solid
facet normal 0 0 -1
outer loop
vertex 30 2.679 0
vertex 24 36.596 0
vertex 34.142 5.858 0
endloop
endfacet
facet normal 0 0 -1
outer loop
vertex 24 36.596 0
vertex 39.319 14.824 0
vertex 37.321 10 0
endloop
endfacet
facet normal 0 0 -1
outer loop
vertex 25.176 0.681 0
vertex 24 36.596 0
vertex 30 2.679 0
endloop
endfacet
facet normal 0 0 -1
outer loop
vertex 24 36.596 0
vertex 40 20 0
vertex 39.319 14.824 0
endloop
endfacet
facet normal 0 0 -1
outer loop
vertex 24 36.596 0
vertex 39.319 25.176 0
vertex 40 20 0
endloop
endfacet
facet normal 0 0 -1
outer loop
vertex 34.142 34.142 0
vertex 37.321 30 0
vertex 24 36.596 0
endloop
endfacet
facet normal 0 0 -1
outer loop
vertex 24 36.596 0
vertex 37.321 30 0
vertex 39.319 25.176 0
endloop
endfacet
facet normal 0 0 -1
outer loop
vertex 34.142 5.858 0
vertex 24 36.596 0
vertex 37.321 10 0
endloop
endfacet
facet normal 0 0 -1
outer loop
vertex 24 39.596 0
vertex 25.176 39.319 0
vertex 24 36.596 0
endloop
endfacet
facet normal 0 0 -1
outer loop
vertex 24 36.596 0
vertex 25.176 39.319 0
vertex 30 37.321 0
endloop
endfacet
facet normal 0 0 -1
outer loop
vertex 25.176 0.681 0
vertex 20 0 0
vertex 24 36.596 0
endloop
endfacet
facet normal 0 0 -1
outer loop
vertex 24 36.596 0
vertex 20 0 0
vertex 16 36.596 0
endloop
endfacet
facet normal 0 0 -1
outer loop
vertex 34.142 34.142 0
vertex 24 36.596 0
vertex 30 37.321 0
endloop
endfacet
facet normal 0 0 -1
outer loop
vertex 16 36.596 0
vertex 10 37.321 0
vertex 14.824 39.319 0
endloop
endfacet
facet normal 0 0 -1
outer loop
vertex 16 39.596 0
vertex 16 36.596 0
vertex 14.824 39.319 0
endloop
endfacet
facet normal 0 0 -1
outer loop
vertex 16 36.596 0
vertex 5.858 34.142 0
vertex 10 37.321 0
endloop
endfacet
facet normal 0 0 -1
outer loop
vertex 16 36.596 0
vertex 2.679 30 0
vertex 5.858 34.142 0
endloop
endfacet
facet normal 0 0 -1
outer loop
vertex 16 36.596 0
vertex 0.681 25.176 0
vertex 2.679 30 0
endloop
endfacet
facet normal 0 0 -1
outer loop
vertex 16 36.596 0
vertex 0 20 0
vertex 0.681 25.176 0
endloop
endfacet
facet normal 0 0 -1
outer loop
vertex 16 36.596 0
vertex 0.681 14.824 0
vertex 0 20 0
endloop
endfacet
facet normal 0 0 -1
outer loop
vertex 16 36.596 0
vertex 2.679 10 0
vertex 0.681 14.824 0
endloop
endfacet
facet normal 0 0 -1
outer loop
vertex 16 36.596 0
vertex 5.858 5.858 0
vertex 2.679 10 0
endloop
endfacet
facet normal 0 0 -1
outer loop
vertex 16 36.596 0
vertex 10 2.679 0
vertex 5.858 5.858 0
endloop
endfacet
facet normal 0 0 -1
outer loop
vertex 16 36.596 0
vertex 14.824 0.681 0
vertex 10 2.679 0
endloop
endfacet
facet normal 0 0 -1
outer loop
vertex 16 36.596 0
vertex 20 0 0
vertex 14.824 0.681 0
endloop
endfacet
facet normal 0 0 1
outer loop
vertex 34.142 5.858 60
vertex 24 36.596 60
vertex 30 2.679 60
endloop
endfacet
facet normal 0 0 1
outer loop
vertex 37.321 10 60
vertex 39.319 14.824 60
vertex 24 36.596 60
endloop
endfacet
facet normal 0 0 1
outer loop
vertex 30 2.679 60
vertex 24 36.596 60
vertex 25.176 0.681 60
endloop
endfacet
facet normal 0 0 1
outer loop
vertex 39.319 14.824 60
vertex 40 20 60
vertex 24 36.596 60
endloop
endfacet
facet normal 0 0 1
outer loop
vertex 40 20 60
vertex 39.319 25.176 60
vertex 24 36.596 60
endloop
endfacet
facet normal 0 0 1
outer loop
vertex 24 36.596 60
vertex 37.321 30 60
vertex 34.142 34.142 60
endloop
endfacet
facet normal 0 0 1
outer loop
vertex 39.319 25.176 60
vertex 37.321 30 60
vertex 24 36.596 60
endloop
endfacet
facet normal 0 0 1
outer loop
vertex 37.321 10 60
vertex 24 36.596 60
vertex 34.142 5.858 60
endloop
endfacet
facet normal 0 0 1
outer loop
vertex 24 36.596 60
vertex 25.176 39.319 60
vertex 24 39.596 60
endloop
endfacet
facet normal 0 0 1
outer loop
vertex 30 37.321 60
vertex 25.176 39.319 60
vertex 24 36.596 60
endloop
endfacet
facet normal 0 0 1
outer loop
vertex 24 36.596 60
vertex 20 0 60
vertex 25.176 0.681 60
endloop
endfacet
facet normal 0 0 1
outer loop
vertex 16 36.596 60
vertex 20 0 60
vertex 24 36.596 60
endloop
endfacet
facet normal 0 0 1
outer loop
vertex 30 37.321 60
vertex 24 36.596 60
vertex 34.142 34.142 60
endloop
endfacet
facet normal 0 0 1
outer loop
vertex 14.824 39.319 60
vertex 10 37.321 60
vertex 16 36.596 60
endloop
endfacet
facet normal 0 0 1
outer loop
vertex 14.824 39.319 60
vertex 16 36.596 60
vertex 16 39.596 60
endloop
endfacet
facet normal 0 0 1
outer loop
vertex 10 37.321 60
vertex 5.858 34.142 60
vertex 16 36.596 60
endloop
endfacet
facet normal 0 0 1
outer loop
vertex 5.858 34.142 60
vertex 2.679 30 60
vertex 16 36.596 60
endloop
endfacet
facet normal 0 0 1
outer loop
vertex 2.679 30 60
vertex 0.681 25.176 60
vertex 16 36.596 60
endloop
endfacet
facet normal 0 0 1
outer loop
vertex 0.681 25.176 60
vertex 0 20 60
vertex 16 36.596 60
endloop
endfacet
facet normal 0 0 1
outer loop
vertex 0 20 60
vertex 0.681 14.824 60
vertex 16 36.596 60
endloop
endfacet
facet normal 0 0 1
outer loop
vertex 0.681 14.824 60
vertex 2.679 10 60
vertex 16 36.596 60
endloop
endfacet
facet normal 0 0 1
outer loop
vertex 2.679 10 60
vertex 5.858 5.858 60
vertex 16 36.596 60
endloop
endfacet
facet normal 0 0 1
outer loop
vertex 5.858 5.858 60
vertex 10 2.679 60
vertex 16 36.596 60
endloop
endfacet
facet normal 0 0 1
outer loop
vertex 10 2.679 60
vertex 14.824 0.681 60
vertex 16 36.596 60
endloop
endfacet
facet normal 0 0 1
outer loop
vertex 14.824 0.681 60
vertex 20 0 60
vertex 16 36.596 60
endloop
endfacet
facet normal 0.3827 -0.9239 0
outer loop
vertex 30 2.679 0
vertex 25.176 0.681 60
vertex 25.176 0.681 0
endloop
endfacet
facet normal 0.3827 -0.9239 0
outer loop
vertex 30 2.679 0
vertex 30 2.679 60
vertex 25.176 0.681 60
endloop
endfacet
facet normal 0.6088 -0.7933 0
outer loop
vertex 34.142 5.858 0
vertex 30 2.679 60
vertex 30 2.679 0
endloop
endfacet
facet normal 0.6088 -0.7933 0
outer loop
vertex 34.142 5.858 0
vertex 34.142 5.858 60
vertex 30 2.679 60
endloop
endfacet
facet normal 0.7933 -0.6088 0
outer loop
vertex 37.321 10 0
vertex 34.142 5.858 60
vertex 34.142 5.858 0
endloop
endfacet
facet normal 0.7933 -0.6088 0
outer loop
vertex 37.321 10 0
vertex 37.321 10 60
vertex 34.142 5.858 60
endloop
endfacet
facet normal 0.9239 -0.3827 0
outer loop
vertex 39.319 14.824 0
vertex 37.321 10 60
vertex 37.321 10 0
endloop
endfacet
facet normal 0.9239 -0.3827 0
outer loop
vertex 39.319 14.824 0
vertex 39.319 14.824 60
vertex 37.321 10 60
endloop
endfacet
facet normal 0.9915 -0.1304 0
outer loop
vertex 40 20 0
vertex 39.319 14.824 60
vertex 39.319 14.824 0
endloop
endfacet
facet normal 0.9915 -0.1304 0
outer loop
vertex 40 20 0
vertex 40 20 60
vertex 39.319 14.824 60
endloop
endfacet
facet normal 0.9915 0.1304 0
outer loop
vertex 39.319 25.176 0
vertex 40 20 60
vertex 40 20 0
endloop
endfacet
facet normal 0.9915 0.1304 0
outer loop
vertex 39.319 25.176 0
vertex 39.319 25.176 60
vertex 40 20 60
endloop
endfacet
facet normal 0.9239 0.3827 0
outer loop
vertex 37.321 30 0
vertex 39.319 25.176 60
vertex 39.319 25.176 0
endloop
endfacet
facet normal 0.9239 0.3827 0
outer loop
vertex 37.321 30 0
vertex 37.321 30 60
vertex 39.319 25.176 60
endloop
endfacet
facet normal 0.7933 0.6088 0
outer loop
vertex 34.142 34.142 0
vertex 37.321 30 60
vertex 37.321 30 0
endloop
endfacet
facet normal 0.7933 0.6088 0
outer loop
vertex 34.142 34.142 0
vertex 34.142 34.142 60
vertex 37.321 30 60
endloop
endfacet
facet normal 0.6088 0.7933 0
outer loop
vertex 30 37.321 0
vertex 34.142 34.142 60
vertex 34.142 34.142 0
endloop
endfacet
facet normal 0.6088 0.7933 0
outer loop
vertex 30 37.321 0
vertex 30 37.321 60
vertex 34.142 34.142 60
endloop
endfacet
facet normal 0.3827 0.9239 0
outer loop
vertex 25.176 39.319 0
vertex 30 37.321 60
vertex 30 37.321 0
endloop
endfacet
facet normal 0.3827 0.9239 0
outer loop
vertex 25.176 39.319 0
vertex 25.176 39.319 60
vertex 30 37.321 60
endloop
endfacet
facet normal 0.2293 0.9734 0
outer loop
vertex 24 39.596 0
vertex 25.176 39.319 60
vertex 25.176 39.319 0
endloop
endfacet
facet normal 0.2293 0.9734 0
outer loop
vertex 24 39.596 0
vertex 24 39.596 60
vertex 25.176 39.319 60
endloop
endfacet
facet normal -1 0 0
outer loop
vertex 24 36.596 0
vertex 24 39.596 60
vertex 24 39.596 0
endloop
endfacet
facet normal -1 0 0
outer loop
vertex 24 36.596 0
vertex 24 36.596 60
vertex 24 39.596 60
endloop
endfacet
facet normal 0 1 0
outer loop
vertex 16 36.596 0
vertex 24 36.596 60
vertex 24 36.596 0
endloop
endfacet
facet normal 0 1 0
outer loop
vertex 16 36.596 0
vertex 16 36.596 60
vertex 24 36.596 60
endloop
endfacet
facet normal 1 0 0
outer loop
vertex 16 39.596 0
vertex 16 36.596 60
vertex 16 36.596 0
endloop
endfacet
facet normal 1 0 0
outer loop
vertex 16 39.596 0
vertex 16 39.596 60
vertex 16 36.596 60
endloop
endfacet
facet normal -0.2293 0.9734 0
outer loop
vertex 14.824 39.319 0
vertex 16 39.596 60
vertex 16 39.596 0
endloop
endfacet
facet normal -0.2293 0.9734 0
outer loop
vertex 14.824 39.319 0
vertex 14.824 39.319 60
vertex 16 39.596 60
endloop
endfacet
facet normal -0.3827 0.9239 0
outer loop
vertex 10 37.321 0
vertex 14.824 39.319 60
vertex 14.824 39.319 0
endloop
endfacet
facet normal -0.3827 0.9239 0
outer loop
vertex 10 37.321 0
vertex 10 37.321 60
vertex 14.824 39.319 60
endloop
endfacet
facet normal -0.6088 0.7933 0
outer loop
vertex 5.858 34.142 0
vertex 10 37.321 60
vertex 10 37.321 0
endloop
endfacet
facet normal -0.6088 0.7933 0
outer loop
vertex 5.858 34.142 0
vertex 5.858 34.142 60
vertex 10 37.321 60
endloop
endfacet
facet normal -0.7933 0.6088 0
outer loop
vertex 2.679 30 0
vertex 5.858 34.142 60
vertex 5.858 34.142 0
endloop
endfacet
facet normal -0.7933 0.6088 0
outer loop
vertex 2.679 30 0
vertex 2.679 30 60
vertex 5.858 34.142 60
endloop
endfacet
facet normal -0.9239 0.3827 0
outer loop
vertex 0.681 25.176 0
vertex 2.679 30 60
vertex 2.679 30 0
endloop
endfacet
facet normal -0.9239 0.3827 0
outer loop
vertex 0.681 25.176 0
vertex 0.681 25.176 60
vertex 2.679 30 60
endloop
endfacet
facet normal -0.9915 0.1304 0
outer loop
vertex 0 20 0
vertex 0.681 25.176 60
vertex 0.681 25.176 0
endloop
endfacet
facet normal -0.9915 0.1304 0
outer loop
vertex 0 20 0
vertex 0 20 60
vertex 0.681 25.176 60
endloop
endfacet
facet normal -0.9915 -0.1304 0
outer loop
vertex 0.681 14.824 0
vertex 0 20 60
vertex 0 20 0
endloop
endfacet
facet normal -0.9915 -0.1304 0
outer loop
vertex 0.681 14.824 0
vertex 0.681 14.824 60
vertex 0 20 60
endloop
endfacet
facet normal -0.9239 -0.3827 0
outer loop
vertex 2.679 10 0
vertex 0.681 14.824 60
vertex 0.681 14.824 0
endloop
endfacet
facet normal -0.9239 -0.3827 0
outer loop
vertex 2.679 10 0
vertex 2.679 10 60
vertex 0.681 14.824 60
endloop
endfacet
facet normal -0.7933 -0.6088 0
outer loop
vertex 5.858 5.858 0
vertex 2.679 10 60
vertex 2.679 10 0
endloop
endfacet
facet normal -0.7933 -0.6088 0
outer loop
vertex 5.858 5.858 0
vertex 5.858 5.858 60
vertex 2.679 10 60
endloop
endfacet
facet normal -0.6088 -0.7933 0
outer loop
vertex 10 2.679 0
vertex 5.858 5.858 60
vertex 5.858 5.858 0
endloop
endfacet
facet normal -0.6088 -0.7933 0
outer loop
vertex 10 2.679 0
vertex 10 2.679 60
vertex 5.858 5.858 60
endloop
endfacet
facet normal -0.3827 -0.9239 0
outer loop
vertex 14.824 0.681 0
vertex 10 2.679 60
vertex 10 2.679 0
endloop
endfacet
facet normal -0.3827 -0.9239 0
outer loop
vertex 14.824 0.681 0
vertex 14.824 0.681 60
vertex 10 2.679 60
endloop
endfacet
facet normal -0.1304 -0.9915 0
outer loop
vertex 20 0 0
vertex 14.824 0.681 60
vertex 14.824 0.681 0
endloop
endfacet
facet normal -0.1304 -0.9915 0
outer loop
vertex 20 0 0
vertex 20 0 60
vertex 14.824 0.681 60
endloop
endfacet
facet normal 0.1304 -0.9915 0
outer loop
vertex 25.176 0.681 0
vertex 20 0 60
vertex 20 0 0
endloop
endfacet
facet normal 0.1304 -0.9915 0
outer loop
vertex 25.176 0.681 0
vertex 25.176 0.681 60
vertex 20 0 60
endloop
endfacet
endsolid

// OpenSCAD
$fn = 32;

// ----------------------------------------------------------------------
// Keyway shaft: d40 shaft, key 8 x 3 mm
// ----------------------------------------------------------------------

// --- parameters (mm) ---
shaft_r = 20;             // shaft radius
key_w = 8;                // keyway width
key_d = 3;                // keyway depth below the surface line
plate_t = 60;             // shaft length, Z (extrusion height)

shaft_d = 2 * shaft_r;  // shaft diameter
circle_step = 15;  // polygon sampling step, degrees

profile = [[14.824, 39.319], [10, 37.321], [5.858, 34.142], [2.679, 30], [0.681, 25.176], [0, 20], [0.681, 14.824], [2.679, 10], [5.858, 5.858], [10, 2.679], [14.824, 0.681], [20, 0], [25.176, 0.681], [30, 2.679], [34.142, 5.858], [37.321, 10], [39.319, 14.824], [40, 20], [39.319, 25.176], [37.321, 30], [34.142, 34.142], [30, 37.321], [25.176, 39.319], [24, 39.596], [24, 36.596], [16, 36.596], [16, 39.596]];  // primary outline, 27 points, counter clockwise

// --- the one profile operation ---
linear_extrude(height = plate_t) polygon(points = profile);
